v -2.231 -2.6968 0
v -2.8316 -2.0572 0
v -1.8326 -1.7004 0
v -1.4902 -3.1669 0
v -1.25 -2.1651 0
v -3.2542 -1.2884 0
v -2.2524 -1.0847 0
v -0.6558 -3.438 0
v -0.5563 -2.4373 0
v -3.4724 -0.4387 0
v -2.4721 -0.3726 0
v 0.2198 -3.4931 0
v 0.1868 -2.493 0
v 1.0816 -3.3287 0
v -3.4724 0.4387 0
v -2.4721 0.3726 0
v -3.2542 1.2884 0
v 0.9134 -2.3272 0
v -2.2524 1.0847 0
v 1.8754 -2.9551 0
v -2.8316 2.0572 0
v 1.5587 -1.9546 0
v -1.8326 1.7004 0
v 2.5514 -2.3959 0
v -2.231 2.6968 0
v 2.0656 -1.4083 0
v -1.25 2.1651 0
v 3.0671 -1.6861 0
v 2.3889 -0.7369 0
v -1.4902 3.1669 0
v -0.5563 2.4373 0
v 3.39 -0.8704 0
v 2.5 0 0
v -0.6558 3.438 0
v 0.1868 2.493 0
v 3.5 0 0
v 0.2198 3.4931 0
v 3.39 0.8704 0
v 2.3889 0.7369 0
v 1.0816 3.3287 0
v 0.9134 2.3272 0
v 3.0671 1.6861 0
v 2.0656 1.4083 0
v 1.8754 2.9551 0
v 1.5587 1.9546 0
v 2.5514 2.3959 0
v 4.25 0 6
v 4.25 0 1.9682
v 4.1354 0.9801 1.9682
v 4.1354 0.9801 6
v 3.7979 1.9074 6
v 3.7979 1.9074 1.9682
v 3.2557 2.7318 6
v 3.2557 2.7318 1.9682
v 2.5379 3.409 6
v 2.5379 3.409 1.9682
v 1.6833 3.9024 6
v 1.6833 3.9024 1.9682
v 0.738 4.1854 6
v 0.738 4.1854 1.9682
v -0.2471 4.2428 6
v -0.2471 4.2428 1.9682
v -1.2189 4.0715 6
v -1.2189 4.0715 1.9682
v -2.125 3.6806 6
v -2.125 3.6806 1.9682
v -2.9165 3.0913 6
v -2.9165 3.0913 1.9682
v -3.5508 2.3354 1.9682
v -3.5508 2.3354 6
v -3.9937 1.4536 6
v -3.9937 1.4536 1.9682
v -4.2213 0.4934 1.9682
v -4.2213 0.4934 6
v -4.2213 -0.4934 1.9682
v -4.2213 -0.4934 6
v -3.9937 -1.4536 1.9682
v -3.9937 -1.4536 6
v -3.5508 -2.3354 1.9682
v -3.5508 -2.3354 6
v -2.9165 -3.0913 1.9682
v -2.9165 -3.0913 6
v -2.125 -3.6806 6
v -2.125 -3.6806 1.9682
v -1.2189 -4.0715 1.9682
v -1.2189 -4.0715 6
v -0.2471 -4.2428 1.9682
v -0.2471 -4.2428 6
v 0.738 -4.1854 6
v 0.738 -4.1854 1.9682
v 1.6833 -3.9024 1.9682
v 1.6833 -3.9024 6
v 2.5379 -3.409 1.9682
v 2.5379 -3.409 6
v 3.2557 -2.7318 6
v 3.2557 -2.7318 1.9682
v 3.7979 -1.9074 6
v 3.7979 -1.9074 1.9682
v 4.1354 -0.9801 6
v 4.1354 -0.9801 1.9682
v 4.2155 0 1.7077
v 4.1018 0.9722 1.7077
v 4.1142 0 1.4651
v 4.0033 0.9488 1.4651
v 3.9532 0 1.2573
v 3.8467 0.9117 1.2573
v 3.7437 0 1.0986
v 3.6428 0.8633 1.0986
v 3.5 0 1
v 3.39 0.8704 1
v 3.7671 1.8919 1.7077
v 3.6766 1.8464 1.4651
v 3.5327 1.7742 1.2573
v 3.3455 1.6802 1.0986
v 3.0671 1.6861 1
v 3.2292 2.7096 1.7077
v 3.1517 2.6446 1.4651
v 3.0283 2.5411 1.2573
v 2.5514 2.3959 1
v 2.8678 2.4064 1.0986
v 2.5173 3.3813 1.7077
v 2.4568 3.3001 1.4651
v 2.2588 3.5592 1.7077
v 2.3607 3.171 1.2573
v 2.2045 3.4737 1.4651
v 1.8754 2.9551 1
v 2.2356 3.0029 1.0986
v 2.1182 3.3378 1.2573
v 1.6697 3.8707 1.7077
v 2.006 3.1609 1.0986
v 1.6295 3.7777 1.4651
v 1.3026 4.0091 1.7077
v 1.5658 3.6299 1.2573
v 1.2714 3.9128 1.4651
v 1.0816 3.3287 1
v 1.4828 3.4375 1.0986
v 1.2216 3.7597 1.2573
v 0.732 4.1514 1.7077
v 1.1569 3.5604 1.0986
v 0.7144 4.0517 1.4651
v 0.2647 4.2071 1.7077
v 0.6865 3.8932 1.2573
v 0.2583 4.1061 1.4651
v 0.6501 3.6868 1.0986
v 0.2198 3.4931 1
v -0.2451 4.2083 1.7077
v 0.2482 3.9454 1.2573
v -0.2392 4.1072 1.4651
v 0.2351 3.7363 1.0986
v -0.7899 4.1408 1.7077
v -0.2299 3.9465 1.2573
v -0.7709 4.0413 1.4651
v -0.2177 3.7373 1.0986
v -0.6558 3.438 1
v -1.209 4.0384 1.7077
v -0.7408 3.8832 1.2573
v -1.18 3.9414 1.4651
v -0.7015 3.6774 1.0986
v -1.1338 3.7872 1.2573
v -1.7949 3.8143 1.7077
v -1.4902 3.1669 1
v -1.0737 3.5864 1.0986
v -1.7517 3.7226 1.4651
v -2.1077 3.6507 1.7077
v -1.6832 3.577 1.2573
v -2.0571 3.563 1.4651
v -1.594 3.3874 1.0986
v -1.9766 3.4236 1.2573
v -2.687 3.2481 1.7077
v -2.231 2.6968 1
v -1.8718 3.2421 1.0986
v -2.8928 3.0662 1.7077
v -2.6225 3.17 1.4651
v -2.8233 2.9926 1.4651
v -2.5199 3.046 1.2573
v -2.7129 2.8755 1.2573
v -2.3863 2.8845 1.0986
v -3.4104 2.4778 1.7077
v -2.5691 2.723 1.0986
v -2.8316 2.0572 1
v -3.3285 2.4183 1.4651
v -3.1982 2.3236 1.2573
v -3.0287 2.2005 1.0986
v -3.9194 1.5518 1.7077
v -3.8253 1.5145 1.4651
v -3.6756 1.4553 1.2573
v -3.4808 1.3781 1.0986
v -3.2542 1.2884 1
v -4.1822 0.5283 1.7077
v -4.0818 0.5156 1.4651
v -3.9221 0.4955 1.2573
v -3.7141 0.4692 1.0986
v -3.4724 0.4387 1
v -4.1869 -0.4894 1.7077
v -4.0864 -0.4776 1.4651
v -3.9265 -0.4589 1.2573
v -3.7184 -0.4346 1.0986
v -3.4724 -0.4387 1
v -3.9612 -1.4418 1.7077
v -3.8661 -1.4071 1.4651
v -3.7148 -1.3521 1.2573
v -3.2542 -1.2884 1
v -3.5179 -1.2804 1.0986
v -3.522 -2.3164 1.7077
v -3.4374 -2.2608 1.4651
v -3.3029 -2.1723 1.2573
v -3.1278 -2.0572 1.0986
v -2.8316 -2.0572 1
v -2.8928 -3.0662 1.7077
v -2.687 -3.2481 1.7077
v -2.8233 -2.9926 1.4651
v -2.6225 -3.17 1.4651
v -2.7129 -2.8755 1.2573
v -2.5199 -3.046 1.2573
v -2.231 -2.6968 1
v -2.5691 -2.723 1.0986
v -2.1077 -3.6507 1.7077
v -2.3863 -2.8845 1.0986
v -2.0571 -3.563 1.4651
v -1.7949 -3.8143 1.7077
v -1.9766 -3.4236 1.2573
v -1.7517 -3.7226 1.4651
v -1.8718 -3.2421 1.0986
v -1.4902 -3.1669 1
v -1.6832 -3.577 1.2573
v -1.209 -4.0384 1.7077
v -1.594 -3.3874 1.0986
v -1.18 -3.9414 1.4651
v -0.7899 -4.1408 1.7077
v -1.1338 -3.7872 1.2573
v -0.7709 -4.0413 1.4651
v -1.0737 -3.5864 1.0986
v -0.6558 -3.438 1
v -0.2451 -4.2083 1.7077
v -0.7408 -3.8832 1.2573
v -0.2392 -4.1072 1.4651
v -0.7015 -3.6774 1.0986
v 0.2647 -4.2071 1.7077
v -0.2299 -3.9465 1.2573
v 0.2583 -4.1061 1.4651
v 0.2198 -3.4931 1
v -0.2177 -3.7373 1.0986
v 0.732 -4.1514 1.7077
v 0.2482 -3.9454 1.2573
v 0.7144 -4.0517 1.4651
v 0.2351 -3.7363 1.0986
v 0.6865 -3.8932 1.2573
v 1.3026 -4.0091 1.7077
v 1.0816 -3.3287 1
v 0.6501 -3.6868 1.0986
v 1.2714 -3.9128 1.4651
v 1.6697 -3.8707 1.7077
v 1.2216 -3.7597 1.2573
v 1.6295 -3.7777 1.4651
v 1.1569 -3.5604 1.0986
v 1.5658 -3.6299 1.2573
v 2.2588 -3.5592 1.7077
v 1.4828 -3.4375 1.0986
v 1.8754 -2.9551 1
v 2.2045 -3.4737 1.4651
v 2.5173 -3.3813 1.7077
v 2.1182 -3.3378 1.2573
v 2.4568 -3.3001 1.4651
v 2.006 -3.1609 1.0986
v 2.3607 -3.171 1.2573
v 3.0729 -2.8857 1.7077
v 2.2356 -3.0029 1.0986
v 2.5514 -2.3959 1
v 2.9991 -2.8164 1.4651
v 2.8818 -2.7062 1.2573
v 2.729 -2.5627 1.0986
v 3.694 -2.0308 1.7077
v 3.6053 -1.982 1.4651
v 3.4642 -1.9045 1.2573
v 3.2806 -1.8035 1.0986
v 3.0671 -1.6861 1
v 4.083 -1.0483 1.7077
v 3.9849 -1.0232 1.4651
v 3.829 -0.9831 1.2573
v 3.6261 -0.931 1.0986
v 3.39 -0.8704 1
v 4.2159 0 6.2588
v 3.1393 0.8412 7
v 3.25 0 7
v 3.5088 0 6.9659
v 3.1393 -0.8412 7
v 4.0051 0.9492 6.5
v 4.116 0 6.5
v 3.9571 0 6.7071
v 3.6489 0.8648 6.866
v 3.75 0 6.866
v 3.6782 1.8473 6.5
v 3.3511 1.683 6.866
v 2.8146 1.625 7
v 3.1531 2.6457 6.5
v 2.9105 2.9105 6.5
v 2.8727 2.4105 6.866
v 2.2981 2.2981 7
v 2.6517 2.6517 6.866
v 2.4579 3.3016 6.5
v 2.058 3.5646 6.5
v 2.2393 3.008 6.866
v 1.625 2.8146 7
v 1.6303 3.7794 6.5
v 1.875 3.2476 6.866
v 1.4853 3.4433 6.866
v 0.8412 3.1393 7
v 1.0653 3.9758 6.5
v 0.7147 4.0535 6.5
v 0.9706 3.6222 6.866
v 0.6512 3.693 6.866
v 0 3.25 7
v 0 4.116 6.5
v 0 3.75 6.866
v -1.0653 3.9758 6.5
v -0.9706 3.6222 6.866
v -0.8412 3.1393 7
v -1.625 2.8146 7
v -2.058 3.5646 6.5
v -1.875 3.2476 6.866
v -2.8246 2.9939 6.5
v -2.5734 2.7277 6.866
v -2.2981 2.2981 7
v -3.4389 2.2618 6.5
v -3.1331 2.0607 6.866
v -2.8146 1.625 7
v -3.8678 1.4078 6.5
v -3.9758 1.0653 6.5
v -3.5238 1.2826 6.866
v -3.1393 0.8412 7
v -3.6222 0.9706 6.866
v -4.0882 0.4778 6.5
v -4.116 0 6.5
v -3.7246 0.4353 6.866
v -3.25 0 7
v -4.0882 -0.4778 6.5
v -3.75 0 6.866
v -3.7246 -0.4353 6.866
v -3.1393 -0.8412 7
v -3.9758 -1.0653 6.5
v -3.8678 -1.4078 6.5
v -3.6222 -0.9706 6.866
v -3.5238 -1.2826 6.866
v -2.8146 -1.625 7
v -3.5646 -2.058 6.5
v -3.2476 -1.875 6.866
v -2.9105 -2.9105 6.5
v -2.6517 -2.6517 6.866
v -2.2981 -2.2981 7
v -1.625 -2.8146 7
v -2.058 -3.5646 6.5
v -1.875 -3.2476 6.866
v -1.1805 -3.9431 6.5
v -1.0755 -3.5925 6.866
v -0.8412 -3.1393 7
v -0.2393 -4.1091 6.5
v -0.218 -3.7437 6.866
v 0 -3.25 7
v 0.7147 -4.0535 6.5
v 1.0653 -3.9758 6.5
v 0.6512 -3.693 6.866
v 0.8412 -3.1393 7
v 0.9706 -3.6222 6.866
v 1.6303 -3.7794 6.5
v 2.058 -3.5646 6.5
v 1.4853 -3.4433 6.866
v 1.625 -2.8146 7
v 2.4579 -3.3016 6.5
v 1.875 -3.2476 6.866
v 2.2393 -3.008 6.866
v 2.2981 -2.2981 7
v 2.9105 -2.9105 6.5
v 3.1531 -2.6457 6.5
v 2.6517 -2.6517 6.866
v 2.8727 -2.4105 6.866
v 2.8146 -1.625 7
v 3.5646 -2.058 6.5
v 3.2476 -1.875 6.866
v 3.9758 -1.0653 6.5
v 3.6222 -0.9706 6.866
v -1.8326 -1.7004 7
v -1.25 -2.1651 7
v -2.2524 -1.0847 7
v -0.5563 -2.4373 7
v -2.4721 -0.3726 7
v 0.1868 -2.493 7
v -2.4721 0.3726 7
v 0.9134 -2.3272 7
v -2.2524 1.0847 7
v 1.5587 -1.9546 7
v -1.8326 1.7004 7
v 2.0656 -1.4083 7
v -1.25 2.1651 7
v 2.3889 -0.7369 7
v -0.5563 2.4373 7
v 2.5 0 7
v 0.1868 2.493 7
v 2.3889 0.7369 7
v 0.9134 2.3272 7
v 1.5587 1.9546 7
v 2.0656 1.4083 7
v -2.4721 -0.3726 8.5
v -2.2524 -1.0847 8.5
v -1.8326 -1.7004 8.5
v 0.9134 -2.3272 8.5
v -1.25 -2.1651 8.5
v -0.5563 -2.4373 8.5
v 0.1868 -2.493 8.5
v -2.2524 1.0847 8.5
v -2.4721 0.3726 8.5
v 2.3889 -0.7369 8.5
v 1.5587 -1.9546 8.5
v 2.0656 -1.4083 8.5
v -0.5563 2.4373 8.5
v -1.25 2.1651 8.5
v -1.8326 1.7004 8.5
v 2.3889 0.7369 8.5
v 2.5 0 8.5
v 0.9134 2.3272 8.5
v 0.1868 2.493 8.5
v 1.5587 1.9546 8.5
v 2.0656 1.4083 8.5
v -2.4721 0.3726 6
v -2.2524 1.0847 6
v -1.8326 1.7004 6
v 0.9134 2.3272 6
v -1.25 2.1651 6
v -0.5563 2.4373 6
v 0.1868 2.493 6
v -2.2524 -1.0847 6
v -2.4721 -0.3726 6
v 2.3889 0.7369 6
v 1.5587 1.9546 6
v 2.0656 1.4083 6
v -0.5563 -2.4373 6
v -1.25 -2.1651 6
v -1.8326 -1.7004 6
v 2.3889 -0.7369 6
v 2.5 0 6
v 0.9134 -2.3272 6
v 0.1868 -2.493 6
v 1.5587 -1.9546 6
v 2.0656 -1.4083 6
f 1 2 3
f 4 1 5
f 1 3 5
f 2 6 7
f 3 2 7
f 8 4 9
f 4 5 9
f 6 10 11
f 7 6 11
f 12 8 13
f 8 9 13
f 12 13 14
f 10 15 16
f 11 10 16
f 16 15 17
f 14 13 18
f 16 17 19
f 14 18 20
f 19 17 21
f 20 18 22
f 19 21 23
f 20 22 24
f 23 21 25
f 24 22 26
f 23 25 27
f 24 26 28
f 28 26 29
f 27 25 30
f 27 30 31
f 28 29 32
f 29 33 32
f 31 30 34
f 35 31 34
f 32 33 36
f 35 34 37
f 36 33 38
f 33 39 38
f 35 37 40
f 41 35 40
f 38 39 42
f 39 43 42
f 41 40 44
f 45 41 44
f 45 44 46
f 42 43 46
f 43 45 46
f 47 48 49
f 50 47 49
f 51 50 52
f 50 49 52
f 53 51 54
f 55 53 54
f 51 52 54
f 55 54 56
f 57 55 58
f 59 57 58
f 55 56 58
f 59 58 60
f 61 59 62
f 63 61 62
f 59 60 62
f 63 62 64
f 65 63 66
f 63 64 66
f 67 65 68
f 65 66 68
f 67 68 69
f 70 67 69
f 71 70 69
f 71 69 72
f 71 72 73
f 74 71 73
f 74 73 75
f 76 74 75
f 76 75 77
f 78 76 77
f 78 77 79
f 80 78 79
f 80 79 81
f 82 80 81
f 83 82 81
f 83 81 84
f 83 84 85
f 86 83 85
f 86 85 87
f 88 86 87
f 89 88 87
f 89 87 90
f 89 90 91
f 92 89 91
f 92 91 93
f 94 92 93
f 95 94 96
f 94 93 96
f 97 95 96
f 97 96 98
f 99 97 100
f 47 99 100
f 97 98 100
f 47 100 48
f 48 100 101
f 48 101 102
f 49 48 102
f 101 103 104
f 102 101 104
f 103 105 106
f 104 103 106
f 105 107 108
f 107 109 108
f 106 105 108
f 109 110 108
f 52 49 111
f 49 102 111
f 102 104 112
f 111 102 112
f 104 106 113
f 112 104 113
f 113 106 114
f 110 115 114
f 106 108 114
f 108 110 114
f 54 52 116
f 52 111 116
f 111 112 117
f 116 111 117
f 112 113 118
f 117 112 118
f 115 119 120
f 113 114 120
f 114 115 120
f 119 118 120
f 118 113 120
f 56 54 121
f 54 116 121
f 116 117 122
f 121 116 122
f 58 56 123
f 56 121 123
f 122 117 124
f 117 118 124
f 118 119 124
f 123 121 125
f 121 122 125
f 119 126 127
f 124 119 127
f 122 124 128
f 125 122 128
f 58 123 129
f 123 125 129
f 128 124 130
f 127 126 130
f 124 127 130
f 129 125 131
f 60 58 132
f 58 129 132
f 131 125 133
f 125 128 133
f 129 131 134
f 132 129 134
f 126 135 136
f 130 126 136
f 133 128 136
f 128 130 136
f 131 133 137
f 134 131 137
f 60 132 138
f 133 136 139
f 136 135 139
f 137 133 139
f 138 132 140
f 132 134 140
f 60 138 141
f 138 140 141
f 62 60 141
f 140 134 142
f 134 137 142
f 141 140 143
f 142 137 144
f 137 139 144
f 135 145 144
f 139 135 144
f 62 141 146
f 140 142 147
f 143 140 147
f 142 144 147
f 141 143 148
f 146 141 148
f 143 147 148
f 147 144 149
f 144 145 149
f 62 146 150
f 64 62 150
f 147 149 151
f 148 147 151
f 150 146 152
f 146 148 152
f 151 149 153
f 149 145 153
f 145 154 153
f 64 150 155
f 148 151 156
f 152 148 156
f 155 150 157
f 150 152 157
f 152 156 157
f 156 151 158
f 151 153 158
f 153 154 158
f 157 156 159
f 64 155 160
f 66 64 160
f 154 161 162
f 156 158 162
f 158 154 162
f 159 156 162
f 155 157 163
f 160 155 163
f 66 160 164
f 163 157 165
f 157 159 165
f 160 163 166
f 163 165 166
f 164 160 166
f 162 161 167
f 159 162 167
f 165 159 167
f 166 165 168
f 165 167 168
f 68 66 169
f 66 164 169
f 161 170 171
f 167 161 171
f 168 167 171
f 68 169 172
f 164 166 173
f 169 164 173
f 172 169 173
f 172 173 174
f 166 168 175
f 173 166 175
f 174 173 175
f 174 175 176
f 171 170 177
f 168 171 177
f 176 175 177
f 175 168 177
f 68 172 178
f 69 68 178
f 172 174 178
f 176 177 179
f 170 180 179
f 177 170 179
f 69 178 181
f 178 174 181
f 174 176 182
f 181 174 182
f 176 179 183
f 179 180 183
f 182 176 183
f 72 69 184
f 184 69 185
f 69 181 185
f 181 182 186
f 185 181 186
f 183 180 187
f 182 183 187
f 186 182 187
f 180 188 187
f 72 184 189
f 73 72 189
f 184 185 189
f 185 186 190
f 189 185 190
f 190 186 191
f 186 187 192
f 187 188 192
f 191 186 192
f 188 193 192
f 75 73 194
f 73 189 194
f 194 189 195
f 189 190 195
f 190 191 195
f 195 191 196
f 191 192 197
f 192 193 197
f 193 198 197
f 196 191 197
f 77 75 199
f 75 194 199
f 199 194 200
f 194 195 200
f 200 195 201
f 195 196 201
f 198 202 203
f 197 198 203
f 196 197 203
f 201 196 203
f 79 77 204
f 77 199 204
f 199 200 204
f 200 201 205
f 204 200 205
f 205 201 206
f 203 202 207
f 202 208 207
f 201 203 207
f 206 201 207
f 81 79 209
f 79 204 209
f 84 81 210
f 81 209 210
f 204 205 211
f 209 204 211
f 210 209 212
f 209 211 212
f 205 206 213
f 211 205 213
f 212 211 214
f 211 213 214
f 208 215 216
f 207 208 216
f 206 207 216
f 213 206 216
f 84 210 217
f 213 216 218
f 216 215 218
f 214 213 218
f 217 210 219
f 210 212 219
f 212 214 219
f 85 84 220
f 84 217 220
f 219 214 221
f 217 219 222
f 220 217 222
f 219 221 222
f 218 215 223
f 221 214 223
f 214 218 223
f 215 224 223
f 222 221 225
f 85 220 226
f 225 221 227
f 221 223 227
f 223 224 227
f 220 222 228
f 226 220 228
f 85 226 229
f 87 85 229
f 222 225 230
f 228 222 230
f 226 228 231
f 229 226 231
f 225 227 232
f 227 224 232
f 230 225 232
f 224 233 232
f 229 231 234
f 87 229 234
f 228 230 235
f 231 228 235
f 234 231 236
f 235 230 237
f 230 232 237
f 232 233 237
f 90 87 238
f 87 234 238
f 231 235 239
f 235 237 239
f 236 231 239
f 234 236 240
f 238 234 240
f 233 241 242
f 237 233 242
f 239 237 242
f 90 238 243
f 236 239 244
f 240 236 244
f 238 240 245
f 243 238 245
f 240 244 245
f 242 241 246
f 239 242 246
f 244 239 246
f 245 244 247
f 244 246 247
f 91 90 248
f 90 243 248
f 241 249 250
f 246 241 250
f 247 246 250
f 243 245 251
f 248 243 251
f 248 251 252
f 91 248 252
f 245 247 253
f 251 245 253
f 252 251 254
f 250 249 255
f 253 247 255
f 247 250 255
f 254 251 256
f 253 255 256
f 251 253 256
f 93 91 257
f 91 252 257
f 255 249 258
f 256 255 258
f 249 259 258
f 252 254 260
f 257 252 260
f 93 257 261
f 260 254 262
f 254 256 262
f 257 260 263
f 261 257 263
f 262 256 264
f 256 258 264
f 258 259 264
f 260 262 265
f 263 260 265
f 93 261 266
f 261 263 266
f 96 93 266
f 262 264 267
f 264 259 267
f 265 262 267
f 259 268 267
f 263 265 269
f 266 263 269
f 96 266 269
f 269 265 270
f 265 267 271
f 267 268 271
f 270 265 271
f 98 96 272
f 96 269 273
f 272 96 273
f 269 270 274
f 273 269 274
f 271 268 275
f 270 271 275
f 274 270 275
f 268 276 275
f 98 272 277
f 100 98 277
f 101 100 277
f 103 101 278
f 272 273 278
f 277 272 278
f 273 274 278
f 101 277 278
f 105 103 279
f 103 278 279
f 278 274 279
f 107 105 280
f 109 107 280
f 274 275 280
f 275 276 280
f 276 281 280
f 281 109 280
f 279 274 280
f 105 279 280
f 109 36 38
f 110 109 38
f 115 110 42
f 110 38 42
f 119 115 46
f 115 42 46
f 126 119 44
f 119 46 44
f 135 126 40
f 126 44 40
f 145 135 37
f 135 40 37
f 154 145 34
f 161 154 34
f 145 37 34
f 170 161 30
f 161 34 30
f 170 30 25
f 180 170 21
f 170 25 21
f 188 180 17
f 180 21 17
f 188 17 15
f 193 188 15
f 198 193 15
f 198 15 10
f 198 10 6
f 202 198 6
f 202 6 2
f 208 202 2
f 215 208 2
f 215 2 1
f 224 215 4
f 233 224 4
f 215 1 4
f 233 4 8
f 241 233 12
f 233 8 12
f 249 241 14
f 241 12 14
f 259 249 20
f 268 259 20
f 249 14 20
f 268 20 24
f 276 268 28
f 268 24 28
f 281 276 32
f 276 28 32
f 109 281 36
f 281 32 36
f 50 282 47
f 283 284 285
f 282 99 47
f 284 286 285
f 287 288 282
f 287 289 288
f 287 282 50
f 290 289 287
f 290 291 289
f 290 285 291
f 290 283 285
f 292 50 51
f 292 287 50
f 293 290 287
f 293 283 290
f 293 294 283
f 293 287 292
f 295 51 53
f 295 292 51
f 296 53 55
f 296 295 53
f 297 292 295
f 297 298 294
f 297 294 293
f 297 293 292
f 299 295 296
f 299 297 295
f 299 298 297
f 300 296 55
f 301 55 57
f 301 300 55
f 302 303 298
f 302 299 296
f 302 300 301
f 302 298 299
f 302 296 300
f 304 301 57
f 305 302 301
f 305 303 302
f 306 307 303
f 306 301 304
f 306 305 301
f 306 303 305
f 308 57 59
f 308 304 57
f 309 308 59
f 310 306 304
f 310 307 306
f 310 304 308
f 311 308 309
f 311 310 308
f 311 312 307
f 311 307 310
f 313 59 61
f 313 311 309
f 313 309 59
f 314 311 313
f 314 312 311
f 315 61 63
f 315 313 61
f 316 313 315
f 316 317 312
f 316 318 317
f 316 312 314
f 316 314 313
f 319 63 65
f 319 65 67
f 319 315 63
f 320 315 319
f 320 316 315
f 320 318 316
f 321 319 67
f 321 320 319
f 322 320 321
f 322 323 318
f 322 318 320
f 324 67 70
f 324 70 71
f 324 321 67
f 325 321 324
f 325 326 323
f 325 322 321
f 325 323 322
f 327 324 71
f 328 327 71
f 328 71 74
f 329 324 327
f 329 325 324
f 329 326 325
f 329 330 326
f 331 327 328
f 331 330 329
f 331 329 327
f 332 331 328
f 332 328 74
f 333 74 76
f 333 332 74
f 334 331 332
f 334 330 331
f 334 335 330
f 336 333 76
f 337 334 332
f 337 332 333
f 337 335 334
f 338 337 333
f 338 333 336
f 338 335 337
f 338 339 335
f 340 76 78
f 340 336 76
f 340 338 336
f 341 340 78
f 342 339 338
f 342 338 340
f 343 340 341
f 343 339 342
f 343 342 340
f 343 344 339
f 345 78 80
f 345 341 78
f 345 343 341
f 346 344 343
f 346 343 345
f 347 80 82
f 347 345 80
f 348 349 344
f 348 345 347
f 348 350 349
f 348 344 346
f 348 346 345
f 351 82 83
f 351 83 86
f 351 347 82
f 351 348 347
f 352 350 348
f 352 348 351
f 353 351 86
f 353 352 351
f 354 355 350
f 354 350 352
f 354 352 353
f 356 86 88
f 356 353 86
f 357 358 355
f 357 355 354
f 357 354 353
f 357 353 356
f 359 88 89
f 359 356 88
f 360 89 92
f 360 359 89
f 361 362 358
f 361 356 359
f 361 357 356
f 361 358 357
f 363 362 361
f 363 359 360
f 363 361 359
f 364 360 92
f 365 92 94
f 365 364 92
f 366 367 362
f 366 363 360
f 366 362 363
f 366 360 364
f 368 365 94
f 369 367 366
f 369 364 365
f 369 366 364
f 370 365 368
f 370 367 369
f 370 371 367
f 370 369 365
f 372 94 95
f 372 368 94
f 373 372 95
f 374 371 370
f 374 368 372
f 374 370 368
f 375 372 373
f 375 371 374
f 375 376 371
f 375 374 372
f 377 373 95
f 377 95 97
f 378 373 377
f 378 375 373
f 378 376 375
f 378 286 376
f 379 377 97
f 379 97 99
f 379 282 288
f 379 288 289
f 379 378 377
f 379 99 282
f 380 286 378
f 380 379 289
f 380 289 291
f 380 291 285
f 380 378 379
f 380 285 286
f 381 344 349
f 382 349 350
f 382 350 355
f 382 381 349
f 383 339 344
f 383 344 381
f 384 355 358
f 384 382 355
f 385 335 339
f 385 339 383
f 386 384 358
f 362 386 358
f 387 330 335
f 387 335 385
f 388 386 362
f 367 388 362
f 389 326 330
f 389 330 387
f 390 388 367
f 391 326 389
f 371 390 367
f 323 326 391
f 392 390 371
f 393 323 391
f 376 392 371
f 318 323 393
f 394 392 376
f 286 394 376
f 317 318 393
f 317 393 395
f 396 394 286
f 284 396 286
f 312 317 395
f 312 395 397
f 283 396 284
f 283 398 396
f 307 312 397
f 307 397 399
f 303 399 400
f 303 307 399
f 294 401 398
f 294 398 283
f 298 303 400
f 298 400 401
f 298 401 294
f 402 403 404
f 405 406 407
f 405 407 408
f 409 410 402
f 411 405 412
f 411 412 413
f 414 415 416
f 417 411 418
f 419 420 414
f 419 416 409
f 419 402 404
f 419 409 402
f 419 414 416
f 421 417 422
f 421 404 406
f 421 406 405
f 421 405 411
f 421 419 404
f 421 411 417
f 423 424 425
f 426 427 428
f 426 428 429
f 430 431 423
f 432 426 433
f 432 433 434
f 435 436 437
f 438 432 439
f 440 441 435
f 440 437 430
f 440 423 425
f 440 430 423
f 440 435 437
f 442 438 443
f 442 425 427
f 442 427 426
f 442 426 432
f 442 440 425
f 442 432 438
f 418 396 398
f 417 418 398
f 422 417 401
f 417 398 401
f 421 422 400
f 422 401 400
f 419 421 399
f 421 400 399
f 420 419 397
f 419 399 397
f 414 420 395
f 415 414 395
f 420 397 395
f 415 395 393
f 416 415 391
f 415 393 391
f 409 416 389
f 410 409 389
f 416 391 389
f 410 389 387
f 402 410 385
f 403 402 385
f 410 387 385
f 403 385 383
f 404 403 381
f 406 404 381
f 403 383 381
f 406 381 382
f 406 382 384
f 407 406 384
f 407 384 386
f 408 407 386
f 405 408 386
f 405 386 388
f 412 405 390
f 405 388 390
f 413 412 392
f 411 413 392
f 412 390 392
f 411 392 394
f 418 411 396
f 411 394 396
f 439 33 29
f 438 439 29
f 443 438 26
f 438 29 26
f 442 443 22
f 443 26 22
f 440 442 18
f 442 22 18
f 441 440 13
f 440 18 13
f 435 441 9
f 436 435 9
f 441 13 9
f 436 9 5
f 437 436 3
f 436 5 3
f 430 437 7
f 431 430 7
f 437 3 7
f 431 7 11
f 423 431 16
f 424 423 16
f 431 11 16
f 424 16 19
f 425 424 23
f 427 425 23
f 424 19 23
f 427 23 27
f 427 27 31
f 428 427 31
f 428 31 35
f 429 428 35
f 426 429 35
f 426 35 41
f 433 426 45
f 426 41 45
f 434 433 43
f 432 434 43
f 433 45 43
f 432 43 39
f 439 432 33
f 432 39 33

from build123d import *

# Parameters (mm, degrees)
F0_R     = 3.5
F1_DEPTH = 1
F2_R     = 4.25
F3_DEPTH = 6
F4_R     = 2.5
F5_DEPTH = 1.5
F7_R     = 2.5
F8_DEPTH = 6


# Not quite as in the source:
# - a fillet or chamfer that OpenCascade refuses, or shapes differently, is made with other operations: its cross-section is extruded or revolved along the edge and cut away or added


with BuildPart() as f1:
    # F0 (on Top) → F1 (new body)
    with BuildSketch(Plane.XY):
        Circle(F0_R)
    extrude(amount=F1_DEPTH)

    # F2 (on face) → F3 (join)
    with BuildSketch(Plane.XY.offset(1)):
        Circle(F2_R)
    extrude(amount=F3_DEPTH)

    # F4 (on face) → F5 (join)
    with BuildSketch(Plane.XY.offset(7)):
        Circle(F4_R)
    extrude(amount=F5_DEPTH)

    # F6: fillet of radius 1 on 2 edges, made by hand

    # F6_s1 → F6_t2 (revolve, cut)
    with BuildSketch(Plane.XZ):
        with BuildLine():
            ThreePointArc((4.25, 6), (3.9571067812, 6.7071067812), (3.25, 7))
            Line((3.25, 7), (4.25, 7))
            Line((4.25, 7), (4.25, 6))
        make_face()
    revolve(axis=Axis((0, 0, 7), (0, 0, 1)), mode=Mode.SUBTRACT)

    # F6_s3 → F6_t4 (revolve, cut)
    with BuildSketch(Plane.XZ):
        with BuildLine():
            ThreePointArc((4.25, 1.9682458366), (4.040569415, 1.3558734009), (3.5, 1))
            Line((3.5, 1), (4.25, 1))
            Line((4.25, 1), (4.25, 1.9682458366))
        make_face()
    revolve(axis=Axis((0, 0, 1), (0, 0, 1)), mode=Mode.SUBTRACT)

    # F7 (on face) → F8 (cut)
    with BuildSketch(Plane(origin=(0, 0, 0), x_dir=(1, 0, 0), z_dir=(0, 0, -1))):
        Circle(F7_R)
    extrude(amount=-F8_DEPTH, mode=Mode.SUBTRACT)


solid = f1.part
